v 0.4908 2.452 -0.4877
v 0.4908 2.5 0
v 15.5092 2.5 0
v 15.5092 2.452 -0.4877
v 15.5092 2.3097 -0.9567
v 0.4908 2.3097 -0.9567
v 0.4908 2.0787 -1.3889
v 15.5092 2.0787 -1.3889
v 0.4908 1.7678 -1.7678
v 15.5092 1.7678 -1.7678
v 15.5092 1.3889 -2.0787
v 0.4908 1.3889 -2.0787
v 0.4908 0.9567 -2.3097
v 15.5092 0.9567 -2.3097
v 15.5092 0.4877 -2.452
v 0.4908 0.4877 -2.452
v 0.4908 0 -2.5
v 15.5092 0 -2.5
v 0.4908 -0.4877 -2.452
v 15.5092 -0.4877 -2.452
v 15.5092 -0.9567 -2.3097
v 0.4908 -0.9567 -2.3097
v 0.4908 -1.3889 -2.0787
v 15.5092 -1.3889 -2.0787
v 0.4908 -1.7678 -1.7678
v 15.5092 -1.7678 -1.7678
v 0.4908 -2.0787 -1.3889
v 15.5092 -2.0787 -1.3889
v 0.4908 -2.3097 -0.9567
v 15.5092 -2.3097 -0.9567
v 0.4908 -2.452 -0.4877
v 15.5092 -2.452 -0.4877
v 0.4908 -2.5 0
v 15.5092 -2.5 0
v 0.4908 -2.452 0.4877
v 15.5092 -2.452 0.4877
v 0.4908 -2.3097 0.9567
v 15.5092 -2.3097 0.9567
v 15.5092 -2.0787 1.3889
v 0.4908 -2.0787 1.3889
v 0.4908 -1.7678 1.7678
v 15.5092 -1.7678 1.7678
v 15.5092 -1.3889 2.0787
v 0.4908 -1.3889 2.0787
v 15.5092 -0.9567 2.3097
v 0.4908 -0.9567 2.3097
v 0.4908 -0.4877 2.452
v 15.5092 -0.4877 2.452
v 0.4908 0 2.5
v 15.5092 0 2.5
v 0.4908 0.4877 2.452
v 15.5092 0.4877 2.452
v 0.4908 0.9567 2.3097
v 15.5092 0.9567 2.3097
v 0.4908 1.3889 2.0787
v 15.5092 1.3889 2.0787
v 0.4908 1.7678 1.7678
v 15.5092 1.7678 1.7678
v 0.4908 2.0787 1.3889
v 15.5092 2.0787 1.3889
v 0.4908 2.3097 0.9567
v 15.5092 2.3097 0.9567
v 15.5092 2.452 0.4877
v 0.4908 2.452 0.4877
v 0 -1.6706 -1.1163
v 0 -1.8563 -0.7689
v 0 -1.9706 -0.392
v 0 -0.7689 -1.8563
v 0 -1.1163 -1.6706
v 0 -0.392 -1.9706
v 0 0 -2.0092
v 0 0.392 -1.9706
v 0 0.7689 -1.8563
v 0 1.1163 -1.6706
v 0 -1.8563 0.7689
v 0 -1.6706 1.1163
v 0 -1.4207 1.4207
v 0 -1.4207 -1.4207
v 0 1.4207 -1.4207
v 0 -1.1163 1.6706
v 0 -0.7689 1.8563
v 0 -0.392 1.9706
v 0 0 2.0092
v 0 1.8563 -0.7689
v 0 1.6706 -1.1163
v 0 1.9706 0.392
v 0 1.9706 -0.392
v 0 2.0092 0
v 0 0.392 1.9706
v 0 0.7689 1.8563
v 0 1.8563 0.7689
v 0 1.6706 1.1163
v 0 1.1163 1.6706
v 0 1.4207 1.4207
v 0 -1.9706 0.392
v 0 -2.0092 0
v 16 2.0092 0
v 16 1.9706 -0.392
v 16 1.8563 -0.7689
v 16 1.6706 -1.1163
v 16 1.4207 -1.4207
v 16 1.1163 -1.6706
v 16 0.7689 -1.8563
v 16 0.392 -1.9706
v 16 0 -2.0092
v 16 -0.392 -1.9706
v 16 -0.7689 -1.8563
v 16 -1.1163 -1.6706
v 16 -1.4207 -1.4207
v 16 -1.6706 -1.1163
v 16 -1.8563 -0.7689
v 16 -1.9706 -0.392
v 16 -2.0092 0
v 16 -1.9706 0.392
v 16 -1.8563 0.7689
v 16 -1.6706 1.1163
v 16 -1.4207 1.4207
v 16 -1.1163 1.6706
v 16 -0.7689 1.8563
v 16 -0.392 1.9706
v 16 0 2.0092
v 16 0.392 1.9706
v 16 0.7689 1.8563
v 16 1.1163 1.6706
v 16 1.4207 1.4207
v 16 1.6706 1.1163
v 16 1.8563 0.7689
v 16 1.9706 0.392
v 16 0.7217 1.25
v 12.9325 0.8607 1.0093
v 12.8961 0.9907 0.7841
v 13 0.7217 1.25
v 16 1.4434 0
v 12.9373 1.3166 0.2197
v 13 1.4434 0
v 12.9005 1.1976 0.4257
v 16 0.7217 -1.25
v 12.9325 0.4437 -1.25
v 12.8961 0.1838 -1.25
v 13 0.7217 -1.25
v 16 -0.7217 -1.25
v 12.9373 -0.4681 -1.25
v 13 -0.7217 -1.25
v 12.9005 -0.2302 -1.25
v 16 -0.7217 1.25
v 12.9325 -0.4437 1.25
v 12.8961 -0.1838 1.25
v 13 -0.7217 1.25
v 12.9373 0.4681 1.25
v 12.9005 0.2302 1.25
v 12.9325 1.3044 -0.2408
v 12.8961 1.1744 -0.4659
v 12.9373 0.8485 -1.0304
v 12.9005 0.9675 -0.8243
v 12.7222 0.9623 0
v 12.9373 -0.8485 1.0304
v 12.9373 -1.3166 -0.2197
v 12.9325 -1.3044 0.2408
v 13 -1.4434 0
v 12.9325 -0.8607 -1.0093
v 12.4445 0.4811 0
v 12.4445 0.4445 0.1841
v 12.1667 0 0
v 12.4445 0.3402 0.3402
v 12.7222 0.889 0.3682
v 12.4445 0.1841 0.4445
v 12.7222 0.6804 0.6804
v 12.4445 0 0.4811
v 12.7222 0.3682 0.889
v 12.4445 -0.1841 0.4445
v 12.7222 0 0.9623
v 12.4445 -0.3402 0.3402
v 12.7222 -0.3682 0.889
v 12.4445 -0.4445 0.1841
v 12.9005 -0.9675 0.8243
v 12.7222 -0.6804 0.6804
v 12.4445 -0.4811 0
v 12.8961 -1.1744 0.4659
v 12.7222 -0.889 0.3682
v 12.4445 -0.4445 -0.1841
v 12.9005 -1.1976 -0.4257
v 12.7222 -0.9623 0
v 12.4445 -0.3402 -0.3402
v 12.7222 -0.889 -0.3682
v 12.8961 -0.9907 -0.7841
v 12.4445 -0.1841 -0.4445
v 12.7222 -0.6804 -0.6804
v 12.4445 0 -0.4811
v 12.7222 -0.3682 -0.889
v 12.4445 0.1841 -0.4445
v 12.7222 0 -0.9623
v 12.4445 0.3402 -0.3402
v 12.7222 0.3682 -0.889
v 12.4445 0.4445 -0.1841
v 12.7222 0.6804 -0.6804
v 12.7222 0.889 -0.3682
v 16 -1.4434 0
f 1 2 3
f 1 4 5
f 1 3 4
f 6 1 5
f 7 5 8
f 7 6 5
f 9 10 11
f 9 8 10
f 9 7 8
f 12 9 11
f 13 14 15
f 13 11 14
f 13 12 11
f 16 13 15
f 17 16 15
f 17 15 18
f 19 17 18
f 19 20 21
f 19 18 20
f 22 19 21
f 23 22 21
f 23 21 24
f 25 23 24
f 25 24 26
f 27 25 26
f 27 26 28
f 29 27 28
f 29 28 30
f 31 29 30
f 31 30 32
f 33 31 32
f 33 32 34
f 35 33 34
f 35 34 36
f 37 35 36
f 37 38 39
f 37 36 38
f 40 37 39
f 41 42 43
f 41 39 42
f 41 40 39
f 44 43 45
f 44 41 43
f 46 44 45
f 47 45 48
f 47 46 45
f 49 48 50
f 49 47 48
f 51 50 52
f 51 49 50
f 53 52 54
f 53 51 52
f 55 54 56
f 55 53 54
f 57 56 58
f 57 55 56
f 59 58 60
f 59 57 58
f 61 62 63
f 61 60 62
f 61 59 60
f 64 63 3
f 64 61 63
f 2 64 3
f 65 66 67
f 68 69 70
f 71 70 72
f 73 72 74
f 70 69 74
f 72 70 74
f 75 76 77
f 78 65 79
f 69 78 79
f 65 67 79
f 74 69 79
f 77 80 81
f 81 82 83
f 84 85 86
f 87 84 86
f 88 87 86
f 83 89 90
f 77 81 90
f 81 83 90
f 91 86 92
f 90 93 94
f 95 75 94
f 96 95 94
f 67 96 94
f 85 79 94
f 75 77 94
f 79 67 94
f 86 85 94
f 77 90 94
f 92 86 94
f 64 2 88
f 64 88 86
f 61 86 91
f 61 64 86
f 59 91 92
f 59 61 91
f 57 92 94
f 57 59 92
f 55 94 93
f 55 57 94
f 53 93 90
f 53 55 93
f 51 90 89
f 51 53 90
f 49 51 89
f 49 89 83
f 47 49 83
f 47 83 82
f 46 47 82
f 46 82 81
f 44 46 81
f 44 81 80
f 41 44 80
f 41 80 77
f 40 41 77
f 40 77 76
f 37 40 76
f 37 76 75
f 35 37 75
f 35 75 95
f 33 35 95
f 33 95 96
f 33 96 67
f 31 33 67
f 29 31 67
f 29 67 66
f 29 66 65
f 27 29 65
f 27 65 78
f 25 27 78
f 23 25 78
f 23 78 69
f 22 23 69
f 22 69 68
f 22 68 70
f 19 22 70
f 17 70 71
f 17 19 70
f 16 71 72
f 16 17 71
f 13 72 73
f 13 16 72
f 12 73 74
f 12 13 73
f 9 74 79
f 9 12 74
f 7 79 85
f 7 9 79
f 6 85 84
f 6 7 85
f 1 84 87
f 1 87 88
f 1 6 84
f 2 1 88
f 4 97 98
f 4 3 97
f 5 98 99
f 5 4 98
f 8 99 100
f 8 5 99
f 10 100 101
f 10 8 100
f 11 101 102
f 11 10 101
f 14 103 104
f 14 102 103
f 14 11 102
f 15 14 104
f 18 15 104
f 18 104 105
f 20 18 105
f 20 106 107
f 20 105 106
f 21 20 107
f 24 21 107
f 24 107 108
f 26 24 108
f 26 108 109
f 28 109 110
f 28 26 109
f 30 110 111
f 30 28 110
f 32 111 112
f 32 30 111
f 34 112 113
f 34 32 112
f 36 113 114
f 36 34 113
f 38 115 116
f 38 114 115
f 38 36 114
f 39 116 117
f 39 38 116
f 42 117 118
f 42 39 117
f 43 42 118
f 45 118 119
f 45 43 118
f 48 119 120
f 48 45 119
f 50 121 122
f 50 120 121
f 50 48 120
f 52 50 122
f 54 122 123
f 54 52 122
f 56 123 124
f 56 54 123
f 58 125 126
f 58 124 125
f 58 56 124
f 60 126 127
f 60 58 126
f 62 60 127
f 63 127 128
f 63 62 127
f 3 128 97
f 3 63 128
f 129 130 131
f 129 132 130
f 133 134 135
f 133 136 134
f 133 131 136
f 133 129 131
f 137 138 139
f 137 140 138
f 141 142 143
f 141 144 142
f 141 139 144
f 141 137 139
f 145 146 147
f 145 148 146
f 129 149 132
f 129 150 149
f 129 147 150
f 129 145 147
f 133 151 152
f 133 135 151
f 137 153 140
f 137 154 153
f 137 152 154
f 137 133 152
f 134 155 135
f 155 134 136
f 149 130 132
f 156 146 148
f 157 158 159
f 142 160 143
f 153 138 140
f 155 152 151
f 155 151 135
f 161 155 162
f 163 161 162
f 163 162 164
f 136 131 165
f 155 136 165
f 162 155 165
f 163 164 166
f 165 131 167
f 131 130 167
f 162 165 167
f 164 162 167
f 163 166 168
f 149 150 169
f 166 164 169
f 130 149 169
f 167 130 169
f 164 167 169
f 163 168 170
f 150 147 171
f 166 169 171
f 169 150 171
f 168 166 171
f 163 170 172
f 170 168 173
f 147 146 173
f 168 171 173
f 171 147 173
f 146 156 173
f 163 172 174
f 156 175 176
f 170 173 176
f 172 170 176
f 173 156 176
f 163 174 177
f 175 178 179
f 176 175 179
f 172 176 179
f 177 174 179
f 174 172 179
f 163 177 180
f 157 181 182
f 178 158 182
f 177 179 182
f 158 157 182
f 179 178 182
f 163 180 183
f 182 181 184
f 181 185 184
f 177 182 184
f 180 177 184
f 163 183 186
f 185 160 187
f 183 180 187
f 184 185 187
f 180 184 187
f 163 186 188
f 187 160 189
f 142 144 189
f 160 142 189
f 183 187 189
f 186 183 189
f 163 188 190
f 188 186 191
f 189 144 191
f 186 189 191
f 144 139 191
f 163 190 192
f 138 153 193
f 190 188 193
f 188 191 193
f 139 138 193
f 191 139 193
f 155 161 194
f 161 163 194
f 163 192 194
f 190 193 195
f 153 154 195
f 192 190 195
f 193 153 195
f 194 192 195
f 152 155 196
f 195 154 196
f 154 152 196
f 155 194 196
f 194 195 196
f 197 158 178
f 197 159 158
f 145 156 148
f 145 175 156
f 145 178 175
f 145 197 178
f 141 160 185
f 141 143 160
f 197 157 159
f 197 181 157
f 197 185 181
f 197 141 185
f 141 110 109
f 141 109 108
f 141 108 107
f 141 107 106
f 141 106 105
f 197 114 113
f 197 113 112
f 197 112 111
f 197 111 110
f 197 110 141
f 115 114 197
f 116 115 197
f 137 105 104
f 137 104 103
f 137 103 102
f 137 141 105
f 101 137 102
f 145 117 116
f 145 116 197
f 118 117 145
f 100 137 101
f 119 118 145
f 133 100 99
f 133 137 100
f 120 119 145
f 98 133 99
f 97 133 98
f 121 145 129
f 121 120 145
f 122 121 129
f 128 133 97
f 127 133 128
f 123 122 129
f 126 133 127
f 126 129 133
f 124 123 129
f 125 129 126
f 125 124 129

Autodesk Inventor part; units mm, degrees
ref_plane "YZ Plane" through (0, 0, 0) normal (1, 0, 0) x (0, 1, 0)
ref_plane "XZ Plane" through (0, 0, 0) normal (0, 1, 0) x (-1, 0, 0)
sketch "Sketch1" plane through (0, 0, 0) normal (0, 0, 1) x (1, 0, 0)
  line L0 (0, 0) -> (12.1667, 0)
  line L1 (16, 1.4434) -> (16, 2.5)
  line L2 (16, 2.5) -> (0, 2.5)
  line L3 (16, 1.4434) -> (13, 1.4434)
  line L4 (13, 1.4434) -> (12.1667, 0)
  line L5 (0, -0.5) -> (0, 3) projected
  line L6 (0, 2.5) -> (0, 0)
  dimension "d0" = 3
  dimension "d1" = 60
  dimension "d2" = 5
  dimension "d3" = 2.8868
  dimension "d5" = 16
revolve "Body" add sketch "Sketch1" angle 360 about axis through (0, 0, 0) along (1, 0, 0)
sketch "Sketch2" plane through (16, 0, 0) normal (1, 0, 0) x (0, 1, 0)
  circle A0 centre (0, 0) radius 1.4434 projected
  line L0 (-0.7217, 1.25) -> (0.7217, 1.25)
  line L1 (0.7217, 1.25) -> (1.4434, 0)
  line L2 (1.4434, 0) -> (0.7217, -1.25)
  line L3 (0.7217, -1.25) -> (-0.7217, -1.25)
  line L4 (-0.7217, -1.25) -> (-1.4434, 0)
  line L5 (-1.4434, 0) -> (-0.7217, 1.25)
  point P0 (0, 0)
  point P1 (0, 0)
extrude "Slot" add sketch "Sketch2" against normal up to next contours L1 A0 | A0 L2 | L0 A0 | A0 L3 | L5 A0 | A0 L4
thread "Thread" size "M5x0.8" class "6g" standard "ISO Metric profile" length 16
chamfer "Chamfer1" distance 0.4908 angle 45 1 edges at (16, -2.5, 0) measured on face at (10.6667, 2.4676, -0.401)
chamfer "Chamfer2" distance 0.4908 angle 45 1 edges at (0, -2.5, 0) measured on face at (5.1697, 2.4919, -0.2012)
ref_plane "Work Plane1" through (8, 0, 0) normal (0, 0, 1) x (1, 0, 0)
equation "\"d8\" = NLG"
equation "\"d10\" = -0.5 * GD1 + 0.5 * NND"
equation "\"d11\" = FAWI"
equation "\"d34\" = -0.5 * GD1 + 0.5 * NND"
equation "\"d12\" = -0.5 * GD1 + 0.5 * NND"
equation "\"d13\" = FAWI"
equation "\"d35\" = -0.5 * GD1 + 0.5 * NND"
equation "\"d0\" = INTI"
equation "\"d2\" = NND"
equation "\"d3\" = 1.1547 * SW"
equation "\"d5\" = NLG"
equation "\"NND\" = 5"
equation "\"NLG\" = 16"
equation "\"INTI\" = 3"
equation "\"FAWI\" = 45deg"
equation "\"SW\" = 2.5"
equation "\"GD1\" = THREADDIA - 1.2269 * PTC"
equation "\"SPD\" = 3.5"
equation "\"GUL\" = 0.61345 * PTC"
equation "\"TOA\" = 30deg"
equation "\"THREADDIA\" = 5"
equation "\"PTC\" = 0.8"
equation "\"FAWI1\" = 45deg"
equation "\"GAL\" = 0.61345 * PTC"
equation "\"E0\" = 1.155 * SW"
properties part number "DIN 913 - M5 x 16" material "Steel, Mild"
